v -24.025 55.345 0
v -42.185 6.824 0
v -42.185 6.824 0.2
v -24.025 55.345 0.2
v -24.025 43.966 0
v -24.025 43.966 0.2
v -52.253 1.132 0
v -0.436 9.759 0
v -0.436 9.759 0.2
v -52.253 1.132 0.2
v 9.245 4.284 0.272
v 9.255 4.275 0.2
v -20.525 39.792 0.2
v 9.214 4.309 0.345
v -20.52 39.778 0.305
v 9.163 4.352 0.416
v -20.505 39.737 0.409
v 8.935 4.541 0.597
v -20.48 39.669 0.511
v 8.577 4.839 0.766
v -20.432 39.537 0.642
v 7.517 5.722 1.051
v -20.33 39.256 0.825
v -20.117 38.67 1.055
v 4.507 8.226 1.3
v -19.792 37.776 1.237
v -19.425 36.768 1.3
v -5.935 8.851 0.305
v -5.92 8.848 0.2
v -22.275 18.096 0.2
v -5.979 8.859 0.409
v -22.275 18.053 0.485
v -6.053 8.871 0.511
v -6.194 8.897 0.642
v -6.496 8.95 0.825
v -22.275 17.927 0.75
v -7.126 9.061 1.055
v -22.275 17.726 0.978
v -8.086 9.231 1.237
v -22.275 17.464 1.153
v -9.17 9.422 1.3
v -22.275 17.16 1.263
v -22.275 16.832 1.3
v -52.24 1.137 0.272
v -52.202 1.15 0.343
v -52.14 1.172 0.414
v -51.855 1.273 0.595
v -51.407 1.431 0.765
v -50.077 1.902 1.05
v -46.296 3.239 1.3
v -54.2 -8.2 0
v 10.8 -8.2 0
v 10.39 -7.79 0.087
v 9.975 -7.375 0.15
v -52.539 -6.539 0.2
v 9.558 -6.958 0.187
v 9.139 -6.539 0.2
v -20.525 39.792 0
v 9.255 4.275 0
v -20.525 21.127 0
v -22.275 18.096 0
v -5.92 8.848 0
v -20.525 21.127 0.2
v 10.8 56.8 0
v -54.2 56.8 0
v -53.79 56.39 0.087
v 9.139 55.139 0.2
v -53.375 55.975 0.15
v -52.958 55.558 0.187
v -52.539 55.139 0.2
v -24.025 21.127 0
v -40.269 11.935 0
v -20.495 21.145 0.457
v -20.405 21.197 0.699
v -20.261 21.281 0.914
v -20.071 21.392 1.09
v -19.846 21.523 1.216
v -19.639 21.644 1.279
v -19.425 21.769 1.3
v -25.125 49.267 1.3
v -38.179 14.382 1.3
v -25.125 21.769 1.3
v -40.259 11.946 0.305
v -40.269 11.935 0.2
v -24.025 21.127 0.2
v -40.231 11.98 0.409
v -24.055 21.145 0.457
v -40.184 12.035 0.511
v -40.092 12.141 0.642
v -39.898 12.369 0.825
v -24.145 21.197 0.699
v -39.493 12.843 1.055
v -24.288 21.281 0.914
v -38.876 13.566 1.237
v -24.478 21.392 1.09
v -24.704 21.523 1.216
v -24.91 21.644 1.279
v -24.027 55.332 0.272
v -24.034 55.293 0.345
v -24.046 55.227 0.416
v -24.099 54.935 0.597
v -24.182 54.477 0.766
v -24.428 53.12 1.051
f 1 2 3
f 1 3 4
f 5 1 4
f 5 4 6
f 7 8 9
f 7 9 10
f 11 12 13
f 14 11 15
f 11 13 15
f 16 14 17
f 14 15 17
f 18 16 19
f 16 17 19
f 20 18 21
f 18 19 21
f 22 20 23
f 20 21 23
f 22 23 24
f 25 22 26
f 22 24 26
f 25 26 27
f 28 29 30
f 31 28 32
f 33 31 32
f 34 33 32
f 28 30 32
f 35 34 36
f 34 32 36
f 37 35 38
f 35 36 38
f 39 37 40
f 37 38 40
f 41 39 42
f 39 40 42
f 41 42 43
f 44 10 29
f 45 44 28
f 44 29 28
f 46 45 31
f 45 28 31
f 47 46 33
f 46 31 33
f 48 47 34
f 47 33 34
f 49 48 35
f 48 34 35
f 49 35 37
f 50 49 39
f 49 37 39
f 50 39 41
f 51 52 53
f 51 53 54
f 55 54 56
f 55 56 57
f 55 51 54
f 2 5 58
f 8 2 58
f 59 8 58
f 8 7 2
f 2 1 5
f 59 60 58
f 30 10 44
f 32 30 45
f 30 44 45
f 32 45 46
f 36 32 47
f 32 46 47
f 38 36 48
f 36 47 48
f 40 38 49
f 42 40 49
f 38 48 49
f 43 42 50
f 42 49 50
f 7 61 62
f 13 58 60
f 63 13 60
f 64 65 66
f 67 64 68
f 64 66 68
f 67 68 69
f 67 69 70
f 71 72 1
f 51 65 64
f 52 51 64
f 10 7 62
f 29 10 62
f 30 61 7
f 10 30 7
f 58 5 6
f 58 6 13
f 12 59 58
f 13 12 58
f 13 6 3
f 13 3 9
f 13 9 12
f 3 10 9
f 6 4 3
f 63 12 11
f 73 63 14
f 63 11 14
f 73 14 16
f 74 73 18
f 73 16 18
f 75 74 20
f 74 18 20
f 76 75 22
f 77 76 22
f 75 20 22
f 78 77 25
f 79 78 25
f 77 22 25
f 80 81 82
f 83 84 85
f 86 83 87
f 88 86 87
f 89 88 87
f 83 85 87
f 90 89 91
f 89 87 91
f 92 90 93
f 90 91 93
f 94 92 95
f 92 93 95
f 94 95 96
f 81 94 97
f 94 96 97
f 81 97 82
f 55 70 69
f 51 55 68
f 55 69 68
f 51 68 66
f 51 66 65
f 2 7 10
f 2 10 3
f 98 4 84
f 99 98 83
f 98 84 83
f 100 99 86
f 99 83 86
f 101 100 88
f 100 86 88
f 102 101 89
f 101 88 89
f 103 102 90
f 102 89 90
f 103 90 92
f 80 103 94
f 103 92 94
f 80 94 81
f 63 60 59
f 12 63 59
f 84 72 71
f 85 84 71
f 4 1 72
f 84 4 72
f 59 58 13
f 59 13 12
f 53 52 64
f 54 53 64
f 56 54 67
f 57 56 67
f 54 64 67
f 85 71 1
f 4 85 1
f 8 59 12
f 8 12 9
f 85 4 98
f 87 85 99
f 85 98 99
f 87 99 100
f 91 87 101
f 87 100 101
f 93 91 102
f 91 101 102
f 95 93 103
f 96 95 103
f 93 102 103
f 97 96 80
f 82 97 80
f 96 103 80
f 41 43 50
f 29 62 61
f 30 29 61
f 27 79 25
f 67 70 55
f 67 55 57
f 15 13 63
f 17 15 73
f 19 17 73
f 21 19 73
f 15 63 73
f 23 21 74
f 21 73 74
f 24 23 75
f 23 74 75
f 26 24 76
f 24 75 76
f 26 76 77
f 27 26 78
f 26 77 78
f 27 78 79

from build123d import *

# Parameters (mm, degrees)
F1_DEPTH    = 1.3
F2_R        = 1.1
F2_2_R      = 1.1
F2_3_R      = 1.1
F4_DEPTH    = 0.2
F5_W        = 65
F5_H        = 65
F6_DEPTH    = 0.2
F7_T1_DEPTH = 73.3066238629
F7_T3_DEPTH = 73.3066238629


# Not quite as in the source:
# - a fillet or chamfer that OpenCascade refuses, or shapes differently, is made with other operations: its cross-section is extruded or revolved along the edge and cut away or added


with BuildPart() as f1:
    # F0 (on Top) → F1 (new body)
    with BuildSketch(Plane.XY):
        Polygon((-24.0248936415, 55.3452231001), (-40.2686429682, 11.9352340698), (-24.0248936415, 21.12738868), align=None)
    extrude(amount=F1_DEPTH)

    # F2
    f2_edges = [f1.edges().sort_by_distance(p)[0] for p in [
        (-32.146768, 33.640229, 1.3),
        (-32.146768, 16.531311, 1.3),
        (-24.024894, 38.236306, 1.3),
    ]]
    fillet(f2_edges, radius=F2_R)


with BuildPart() as f1b:
    # F0 (on Top) → F1, piece 2 (new body)
    with BuildSketch(Plane.XY):
        Polygon((9.2553134576, 4.275105228), (-20.5248936415, 39.791662), (-20.5248936415, 21.12738868), align=None)
    extrude(amount=F1_DEPTH)

    # F2#2
    f2_2_edges = [f1b.edges().sort_by_distance(p)[0] for p in [
        (-5.63479, 22.033384, 1.3),
        (-20.524894, 30.459525, 1.3),
        (-5.63479, 12.701247, 1.3),
    ]]
    fillet(f2_2_edges, radius=F2_2_R)


with BuildPart() as f1c:
    # F0 (on Top) → F1, piece 3 (new body)
    with BuildSketch(Plane.XY):
        Polygon((-52.2528748298, 1.1320981874), (-5.9204182833, 8.8481357249), (-22.2748936415, 18.0962997667), align=None)
    extrude(amount=F1_DEPTH)

    # F2#3
    f2_3_edges = [f1c.edges().sort_by_distance(p)[0] for p in [
        (-29.086647, 4.990117, 1.3),
        (-14.097656, 13.472218, 1.3),
        (-37.263884, 9.614199, 1.3),
    ]]
    fillet(f2_3_edges, radius=F2_3_R)


with BuildPart() as f4:
    # F3 (on face) → F4 (new body)
    with BuildSketch(Plane(origin=(0, 0, 0), x_dir=(1, 0, 0), z_dir=(0, 0, -1))):
        Polygon((-20.5248936415, -39.791662), (9.2553134576, -4.275105228), (-0.4357972381, -9.759195512), (-52.2528104484, -1.1320952326), (-42.1848930418, -6.8243145943), (-24.0248637821, -55.3452596068), (-24.0248637821, -43.9658065178), align=None)
    extrude(amount=-F4_DEPTH)


with BuildPart() as f6:
    # F5 (on Top) → F6 (new body)
    with BuildSketch(Plane.XY):
        with Locations((-21.6999987885, 24.2999990284)):
            Rectangle(F5_W, F5_H)
    extrude(amount=F6_DEPTH)

    # F7: fillet of radius 7 on 4 edges, made by hand

    # F7_s2 → F7_t1 (cut)
    with BuildSketch(Plane.YZ.offset(-58.35331072)):
        with BuildLine():
            ThreePointArc((-8.2000009716, 0), (-7.3753362255, 0.1498201416), (-6.538676199, 0.2))
            Line((-6.538676199, 0.2), (-8.2000009716, 0.2))
            Line((-8.2000009716, 0.2), (-8.2000009716, 0))
        make_face()
        with BuildLine():
            ThreePointArc((56.7999990284, 0), (55.9753342824, 0.1498201416), (55.1386742559, 0.2))
            Line((55.1386742559, 0.2), (56.7999990284, 0.2))
            Line((56.7999990284, 0.2), (56.7999990284, 0))
        make_face()
    extrude(amount=F7_T1_DEPTH, mode=Mode.SUBTRACT)

    # F7_s4 → F7_t3 (cut)
    with BuildSketch(Plane.XZ.offset(-60.9533109599)):
        with BuildLine():
            ThreePointArc((10.8000012115, 0), (9.9753364654, 0.1498201416), (9.1386764389, 0.2))
            Line((9.1386764389, 0.2), (10.8000012115, 0.2))
            Line((10.8000012115, 0.2), (10.8000012115, 0))
        make_face()
        with BuildLine():
            ThreePointArc((-52.538674016, 0.2), (-53.3753340425, 0.1498201416), (-54.1999987885, 0))
            Line((-54.1999987885, 0), (-54.1999987885, 0.2))
            Line((-54.1999987885, 0.2), (-52.538674016, 0.2))
        make_face()
    extrude(amount=F7_T3_DEPTH, mode=Mode.SUBTRACT)


solid = Compound([f1.part, f1b.part, f1c.part, f4.part, f6.part])
